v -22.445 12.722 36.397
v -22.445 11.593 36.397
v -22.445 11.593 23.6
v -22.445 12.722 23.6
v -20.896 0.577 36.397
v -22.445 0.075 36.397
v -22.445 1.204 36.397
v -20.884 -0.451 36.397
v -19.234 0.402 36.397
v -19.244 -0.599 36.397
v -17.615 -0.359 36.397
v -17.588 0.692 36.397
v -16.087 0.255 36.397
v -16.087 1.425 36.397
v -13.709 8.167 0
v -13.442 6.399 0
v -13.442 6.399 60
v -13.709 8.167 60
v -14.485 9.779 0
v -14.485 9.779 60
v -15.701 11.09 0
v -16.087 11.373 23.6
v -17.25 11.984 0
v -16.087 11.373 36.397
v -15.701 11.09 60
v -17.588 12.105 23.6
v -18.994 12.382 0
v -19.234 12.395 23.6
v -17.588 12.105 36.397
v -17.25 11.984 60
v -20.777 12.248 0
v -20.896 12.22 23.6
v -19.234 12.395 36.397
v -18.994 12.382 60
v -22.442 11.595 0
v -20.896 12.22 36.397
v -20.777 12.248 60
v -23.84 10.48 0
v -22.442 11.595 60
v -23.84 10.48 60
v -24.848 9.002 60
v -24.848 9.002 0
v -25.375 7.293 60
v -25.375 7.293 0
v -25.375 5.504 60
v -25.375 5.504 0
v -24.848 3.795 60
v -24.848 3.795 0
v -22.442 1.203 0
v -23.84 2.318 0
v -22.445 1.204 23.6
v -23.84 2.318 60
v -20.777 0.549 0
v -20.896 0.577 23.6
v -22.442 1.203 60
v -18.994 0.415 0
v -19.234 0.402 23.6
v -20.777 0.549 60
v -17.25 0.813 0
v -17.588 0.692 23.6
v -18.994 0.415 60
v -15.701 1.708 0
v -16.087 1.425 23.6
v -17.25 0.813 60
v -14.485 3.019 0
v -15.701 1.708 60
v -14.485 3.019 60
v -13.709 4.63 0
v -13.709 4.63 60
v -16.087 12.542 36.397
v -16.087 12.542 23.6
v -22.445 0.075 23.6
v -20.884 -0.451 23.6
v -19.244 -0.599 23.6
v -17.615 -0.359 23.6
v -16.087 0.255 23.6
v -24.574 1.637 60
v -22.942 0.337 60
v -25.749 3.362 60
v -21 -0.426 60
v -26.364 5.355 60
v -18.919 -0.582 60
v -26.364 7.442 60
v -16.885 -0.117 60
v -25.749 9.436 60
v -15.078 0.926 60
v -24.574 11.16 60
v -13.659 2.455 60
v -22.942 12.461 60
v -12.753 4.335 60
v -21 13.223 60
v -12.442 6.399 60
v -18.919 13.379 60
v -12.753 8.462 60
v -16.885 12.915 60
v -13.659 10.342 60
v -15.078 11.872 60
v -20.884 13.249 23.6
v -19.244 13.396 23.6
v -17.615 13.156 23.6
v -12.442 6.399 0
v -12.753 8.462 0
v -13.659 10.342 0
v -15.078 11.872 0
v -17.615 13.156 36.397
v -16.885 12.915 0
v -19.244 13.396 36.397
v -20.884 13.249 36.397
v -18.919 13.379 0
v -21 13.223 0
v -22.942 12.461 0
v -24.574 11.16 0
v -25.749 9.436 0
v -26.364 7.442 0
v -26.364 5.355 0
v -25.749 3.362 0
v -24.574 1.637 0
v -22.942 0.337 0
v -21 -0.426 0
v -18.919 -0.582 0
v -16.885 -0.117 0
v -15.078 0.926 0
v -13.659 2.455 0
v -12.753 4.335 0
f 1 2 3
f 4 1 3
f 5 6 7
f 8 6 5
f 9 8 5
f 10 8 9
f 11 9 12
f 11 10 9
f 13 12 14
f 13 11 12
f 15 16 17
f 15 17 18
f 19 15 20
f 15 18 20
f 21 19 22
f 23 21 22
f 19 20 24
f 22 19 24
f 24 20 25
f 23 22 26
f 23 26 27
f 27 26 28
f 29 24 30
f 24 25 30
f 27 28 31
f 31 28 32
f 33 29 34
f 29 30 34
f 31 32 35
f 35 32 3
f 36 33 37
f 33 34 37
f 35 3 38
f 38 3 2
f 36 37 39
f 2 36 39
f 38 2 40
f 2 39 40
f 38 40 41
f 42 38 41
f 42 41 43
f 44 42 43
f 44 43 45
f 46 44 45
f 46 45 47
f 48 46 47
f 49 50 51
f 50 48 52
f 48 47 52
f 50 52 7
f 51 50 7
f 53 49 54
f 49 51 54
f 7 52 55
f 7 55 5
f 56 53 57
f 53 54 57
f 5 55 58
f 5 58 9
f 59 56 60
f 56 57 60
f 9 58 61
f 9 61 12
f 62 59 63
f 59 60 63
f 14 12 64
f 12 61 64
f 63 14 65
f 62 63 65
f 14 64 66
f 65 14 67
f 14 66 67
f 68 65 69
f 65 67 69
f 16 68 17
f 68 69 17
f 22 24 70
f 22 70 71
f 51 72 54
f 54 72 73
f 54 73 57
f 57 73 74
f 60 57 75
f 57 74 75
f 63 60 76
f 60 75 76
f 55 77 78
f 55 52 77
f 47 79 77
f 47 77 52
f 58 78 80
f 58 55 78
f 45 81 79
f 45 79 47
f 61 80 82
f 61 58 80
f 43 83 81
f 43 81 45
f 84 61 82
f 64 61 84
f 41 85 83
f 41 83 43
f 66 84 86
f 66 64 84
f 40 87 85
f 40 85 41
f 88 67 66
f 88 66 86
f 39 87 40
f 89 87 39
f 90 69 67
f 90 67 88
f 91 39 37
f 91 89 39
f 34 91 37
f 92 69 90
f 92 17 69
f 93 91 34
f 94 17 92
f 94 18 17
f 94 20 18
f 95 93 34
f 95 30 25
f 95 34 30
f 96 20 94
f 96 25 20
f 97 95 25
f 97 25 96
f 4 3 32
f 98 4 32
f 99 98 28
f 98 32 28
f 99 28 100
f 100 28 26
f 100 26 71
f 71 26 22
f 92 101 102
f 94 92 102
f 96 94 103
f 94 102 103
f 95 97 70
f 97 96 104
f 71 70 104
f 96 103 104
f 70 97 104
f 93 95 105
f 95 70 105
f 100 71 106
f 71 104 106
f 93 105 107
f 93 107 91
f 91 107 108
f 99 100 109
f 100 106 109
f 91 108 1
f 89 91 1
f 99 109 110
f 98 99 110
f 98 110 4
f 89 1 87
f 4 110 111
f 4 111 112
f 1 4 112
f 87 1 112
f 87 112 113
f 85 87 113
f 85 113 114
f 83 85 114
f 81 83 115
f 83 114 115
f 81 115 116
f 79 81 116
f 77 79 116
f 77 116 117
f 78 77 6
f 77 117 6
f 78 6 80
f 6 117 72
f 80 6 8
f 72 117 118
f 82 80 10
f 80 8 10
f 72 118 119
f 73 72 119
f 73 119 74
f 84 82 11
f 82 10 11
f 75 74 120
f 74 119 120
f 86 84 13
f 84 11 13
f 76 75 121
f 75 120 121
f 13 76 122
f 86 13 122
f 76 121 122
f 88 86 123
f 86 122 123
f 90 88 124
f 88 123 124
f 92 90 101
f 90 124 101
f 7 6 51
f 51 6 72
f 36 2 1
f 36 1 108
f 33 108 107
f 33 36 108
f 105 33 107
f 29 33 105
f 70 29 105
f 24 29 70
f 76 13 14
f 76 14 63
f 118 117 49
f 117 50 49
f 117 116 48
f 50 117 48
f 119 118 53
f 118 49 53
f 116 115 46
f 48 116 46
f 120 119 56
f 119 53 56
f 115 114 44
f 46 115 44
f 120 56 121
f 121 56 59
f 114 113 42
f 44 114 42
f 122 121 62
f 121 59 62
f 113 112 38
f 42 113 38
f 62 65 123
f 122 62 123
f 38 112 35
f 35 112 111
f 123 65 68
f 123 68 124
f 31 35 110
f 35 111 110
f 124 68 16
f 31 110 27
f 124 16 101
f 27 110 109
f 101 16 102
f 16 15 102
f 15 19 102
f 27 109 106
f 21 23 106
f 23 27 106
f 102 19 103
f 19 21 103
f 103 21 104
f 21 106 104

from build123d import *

# Parameters (mm, degrees)
ESBO_O1_R                  = 7
RESSALTO_EXTRUS_O1_DEPTH   = 60
ESBO_O2_R                  = 6
CORTE_EXTRUS_O1_DEPTH      = 71
CORTE_EXTRUS_O2_DEPTH      = 21
CORTE_EXTRUS_O2_DEPTH_BACK = 21
ESBO_O3_W                  = 6.357761197
ESBO_O3_H                  = 12.7967598


with BuildPart() as part:
    # Esboço1 → Ressalto-extrusão1 (new body)
    with BuildSketch(Plane.XY):
        with Locations((-19.442180611, 6.398692353)):
            Circle(ESBO_O1_R)
    extrude(amount=RESSALTO_EXTRUS_O1_DEPTH)

    # Esboço2 → Corte-extrusão1 (cut)
    with BuildSketch(Plane.XY.offset(60)):
        with Locations((-19.442180611, 6.398692353)):
            Circle(ESBO_O2_R)
    extrude(amount=-CORTE_EXTRUS_O1_DEPTH, mode=Mode.SUBTRACT)

    # Esboço3 → Corte-extrusão2 (cut, two sides: drawn at the far end of the back side and taken through both)
    with BuildSketch(Plane(origin=(0, 0, 0), x_dir=(1, 0, 0), z_dir=(0, 1, 0)).offset(-CORTE_EXTRUS_O2_DEPTH_BACK)):
        with Locations((-19.265634303, -29.9983799)):
            Rectangle(ESBO_O3_W, ESBO_O3_H)
    extrude(amount=CORTE_EXTRUS_O2_DEPTH + CORTE_EXTRUS_O2_DEPTH_BACK, mode=Mode.SUBTRACT)


solid = part.part
